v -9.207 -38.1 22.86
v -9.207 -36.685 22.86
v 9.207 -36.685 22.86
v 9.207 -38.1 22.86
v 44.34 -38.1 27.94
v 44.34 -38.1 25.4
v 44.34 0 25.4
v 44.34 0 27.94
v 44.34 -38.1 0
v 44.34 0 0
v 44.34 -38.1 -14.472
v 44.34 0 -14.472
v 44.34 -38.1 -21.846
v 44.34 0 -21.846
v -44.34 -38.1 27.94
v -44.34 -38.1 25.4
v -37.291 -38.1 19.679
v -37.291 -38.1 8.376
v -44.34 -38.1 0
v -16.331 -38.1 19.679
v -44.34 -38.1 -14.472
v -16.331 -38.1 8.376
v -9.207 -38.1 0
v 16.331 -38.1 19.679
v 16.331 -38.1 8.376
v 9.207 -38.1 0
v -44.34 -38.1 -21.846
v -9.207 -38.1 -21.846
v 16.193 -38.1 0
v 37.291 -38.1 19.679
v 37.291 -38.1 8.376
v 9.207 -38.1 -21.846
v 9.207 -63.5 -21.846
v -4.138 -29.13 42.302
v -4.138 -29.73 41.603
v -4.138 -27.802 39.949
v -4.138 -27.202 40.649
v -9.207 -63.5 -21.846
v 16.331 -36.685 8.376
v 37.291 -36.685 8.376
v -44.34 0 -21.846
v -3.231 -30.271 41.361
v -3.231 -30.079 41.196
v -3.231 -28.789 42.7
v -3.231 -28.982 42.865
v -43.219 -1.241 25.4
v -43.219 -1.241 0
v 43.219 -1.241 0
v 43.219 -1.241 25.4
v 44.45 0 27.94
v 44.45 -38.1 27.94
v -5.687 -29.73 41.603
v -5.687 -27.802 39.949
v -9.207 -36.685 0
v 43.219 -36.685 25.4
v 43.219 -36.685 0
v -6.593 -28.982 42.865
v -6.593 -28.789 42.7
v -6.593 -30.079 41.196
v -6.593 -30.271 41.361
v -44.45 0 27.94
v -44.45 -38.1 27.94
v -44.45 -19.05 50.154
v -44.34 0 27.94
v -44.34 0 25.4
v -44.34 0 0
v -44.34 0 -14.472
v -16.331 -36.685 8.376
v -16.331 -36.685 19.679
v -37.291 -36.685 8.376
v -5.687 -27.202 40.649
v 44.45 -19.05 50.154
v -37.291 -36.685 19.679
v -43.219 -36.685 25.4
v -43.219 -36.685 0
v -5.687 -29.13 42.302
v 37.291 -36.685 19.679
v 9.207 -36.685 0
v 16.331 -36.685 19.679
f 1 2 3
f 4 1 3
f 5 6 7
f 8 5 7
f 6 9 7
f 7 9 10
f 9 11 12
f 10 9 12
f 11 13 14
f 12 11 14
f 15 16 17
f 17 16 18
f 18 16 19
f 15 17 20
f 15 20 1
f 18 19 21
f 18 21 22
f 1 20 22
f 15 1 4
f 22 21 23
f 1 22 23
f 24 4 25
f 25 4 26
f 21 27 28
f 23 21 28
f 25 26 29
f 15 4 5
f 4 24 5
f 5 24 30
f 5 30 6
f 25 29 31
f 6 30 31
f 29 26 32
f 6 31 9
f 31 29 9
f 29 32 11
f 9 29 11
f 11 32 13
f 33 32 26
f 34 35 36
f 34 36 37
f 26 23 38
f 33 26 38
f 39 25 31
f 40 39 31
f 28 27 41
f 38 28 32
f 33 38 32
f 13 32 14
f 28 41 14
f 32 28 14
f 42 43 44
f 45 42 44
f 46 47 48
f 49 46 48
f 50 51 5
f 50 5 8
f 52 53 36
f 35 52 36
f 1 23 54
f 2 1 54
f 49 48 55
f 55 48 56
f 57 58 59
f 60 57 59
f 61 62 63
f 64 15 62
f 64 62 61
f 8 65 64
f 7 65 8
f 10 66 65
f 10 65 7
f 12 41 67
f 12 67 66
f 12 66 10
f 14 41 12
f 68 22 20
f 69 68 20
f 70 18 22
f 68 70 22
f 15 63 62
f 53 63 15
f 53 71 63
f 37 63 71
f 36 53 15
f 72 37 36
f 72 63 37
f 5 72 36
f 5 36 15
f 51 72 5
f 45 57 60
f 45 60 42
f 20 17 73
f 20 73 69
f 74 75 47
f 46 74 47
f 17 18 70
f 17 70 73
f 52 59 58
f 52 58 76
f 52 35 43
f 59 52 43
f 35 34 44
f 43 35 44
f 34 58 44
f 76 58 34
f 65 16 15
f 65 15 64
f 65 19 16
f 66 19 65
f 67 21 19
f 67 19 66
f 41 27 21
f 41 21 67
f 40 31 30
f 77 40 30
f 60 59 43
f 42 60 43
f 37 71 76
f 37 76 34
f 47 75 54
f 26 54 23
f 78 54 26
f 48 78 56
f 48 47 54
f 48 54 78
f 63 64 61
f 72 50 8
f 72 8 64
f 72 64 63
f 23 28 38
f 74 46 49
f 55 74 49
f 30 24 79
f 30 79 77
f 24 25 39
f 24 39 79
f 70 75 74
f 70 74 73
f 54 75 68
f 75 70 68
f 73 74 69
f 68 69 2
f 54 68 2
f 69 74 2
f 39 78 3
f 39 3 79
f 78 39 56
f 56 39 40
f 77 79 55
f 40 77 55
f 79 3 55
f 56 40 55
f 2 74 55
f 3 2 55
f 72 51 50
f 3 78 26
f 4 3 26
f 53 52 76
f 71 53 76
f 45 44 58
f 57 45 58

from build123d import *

# Parameters (mm, degrees)
F0_W      = 44.3399958313
F0_H      = 14.4718540832
F1_DEPTH  = 38.1
F2_W      = 34.0127944946
F2_H      = 1.2406939641
F2_W_2    = 18.4130221605
F3_DEPTH  = 25.4
F4_W      = 20.9599845111
F4_H      = 11.3026611507
F5_DEPTH  = 25.4
F6_W      = 18.4130221605
F6_H      = 1.415140456
F7_DEPTH  = 2.54
F8_W      = 18.4130221605
F8_H      = 21.8460503966
F9_DEPTH  = 25.4
F11_DEPTH = 25.4
F12_W     = 88.6799916625
F12_H     = 38.1
F13_DEPTH = 2.54
F15_DEPTH = 44.45
F16_W     = 31.7063815892
F16_H     = 38.1
F17_DEPTH = 25.4
F18_W     = 1.5490213409
F18_H     = 0.9214421734
F19_DEPTH = 2.54
F20_W     = 0.7745106705
F20_H     = 0.4545422271
F20_H_2   = 0.4668999463
F21_DEPTH = 0.254


with BuildPart() as f1:
    # F0 (on Front) → F1 (new body)
    with BuildSketch(Plane.XZ):
        with Locations((22.1699979156, -7.2359270416)):
            Rectangle(F0_W, F0_H)
        with Locations((-22.1699979156, -7.2359270416)):
            Rectangle(F0_W, F0_H)
        Polygon((44.3399958313, -14.4718540832), (0, -14.4718540832), (-44.3399958313, -14.4718540832), (-76.0463774204, -14.4718540832), (-76.0463774204, -21.8460503966), (0, -21.8460503966), (76.0463774204, -21.8460503966), (76.0463774204, -14.4718540832), align=None)
    extrude(amount=F1_DEPTH)

    # F2 (on face) → F3 (join)
    with BuildSketch(Plane.XY):
        with Locations((-26.2129083276, -0.620346982)):
            Rectangle(F2_W, F2_H)
        with Locations((0, -0.620346982)):
            Rectangle(F2_W_2, F2_H)
        with Locations((26.2129083276, -0.620346982)):
            Rectangle(F2_W, F2_H)
        Polygon((-43.2193055749, -1.2406939641), (-43.2193055749, 0), (-44.3399958313, 0), (-44.3399958313, -36.684859544), (-43.2193055749, -36.684859544), align=None)
        Polygon((-44.3399958313, -38.1), (-9.2065110803, -38.1), (-9.2065110803, -36.684859544), (-43.2193055749, -36.684859544), (-44.3399958313, -36.684859544), align=None)
        Polygon((44.3399958313, -38.1), (44.3399958313, -36.684859544), (43.2193055749, -36.684859544), (9.2065110803, -36.684859544), (9.2065110803, -38.1), align=None)
        Polygon((44.3399958313, -36.684859544), (44.3399958313, 0), (43.2193055749, 0), (43.2193055749, -1.2406939641), (43.2193055749, -36.684859544), align=None)
    extrude(amount=F3_DEPTH)

    # F4 (on face) → F5 (cut)
    with BuildSketch(Plane.XZ.offset(38.1)):
        with Locations((-26.8112961203, 14.027569443)):
            Rectangle(F4_W, F4_H)
        with Locations((26.8112961203, 14.027569443)):
            Rectangle(F4_W, F4_H)
    extrude(amount=-F5_DEPTH, mode=Mode.SUBTRACT)

    # F6 (on face) → F7 (join)
    with BuildSketch(Plane.XY.offset(25.4)):
        with Locations((0, -37.392429772)):
            Rectangle(F6_W, F6_H)
    extrude(amount=-F7_DEPTH)

    # F8 (on face) → F9 (join)
    with BuildSketch(Plane.XZ.offset(38.1)):
        with Locations((0, -10.9230251983)):
            Rectangle(F8_W, F8_H)
    extrude(amount=F9_DEPTH)

    # F10 (on face) → F11 (cut)
    with BuildSketch(Plane(origin=(-9.2065110803, 0, 0), x_dir=(0, -1, 0), z_dir=(-1, 0, 0))):
        Polygon((63.5, 0), (38.1, 0), (63.5, -21.8460503966), align=None)
    extrude(amount=-F11_DEPTH, mode=Mode.SUBTRACT)

    # F12 (on face) → F13 (join)
    with BuildSketch(Plane.XY.offset(25.4)):
        with Locations((0, -19.05)):
            Rectangle(F12_W, F12_H)
    extrude(amount=F13_DEPTH)

    # F14 (on Right) → F15 (join, symmetric)
    with BuildSketch(Plane.YZ):
        Polygon((-38.1, 27.94), (-19.05, 27.94), (-19.05, 50.1542687416), align=None)
        Polygon((-19.05, 27.94), (0, 27.94), (-19.05, 50.1542687416), align=None)
    extrude(amount=F15_DEPTH, both=True)

    # F16 (on face) → F17 (cut)
    with BuildSketch(Plane.XY.offset(-14.4718540832)):
        with Locations((60.1931866258, -19.05)):
            Rectangle(F16_W, F16_H)
        with Locations((-60.1931866258, -19.05)):
            Rectangle(F16_W, F16_H)
    extrude(amount=-F17_DEPTH, mode=Mode.SUBTRACT)

    # F18 (on face) → F19 (join)
    with BuildSketch(Plane(origin=(0, -35.7612087902, 30.6672722554), x_dir=(1, 0, 0), z_dir=(0, -0.7591012698, 0.650972551))):
        with Locations((-4.9122394994, 12.6880933531)):
            Rectangle(F18_W, F18_H)
    extrude(amount=F19_DEPTH)

    # F20 (on face) → F21 (join)
    with BuildSketch(Plane(origin=(0, -37.6893260156, 32.3207425348), x_dir=(1, 0, 0), z_dir=(0, -0.7591012698, 0.650972551))):
        Polygon((-5.6867501698, 13.1488144398), (-4.9122394994, 13.1488144398), (-4.9122394994, 13.6726424098), (-6.5931216814, 13.6726424098), (-6.5931216814, 12.6819144934), (-5.6867501698, 12.6819144934), align=None)
        Polygon((-4.9122394994, 13.1488144398), (-4.1377288289, 13.1488144398), (-4.1377288289, 12.6819144934), (-3.2313573174, 12.6819144934), (-3.2313573174, 13.6726424098), (-4.9122394994, 13.6726424098), align=None)
        Polygon((-3.2313573174, 12.6819144934), (-4.1377288289, 12.6819144934), (-4.1377288289, 12.2273722664), (-4.9122394994, 12.2273722664), (-4.9122394994, 11.6911865771), (-3.2313573174, 11.6911865771), align=None)
        with Locations((-5.2994948346, 12.4546433799)):
            Rectangle(F20_W, F20_H)
        with Locations((-5.2994948346, 12.9153644666)):
            Rectangle(F20_W, F20_H_2)
        with Locations((-4.5249841642, 12.9153644666)):
            Rectangle(F20_W, F20_H_2)
        with Locations((-4.5249841642, 12.4546433799)):
            Rectangle(F20_W, F20_H)
        Polygon((-5.6867501698, 12.2273722664), (-5.6867501698, 12.6819144934), (-6.5931216814, 12.6819144934), (-6.5931216814, 11.6911865771), (-4.9122394994, 11.6911865771), (-4.9122394994, 12.2273722664), align=None)
    extrude(amount=F21_DEPTH)


solid = f1.part
